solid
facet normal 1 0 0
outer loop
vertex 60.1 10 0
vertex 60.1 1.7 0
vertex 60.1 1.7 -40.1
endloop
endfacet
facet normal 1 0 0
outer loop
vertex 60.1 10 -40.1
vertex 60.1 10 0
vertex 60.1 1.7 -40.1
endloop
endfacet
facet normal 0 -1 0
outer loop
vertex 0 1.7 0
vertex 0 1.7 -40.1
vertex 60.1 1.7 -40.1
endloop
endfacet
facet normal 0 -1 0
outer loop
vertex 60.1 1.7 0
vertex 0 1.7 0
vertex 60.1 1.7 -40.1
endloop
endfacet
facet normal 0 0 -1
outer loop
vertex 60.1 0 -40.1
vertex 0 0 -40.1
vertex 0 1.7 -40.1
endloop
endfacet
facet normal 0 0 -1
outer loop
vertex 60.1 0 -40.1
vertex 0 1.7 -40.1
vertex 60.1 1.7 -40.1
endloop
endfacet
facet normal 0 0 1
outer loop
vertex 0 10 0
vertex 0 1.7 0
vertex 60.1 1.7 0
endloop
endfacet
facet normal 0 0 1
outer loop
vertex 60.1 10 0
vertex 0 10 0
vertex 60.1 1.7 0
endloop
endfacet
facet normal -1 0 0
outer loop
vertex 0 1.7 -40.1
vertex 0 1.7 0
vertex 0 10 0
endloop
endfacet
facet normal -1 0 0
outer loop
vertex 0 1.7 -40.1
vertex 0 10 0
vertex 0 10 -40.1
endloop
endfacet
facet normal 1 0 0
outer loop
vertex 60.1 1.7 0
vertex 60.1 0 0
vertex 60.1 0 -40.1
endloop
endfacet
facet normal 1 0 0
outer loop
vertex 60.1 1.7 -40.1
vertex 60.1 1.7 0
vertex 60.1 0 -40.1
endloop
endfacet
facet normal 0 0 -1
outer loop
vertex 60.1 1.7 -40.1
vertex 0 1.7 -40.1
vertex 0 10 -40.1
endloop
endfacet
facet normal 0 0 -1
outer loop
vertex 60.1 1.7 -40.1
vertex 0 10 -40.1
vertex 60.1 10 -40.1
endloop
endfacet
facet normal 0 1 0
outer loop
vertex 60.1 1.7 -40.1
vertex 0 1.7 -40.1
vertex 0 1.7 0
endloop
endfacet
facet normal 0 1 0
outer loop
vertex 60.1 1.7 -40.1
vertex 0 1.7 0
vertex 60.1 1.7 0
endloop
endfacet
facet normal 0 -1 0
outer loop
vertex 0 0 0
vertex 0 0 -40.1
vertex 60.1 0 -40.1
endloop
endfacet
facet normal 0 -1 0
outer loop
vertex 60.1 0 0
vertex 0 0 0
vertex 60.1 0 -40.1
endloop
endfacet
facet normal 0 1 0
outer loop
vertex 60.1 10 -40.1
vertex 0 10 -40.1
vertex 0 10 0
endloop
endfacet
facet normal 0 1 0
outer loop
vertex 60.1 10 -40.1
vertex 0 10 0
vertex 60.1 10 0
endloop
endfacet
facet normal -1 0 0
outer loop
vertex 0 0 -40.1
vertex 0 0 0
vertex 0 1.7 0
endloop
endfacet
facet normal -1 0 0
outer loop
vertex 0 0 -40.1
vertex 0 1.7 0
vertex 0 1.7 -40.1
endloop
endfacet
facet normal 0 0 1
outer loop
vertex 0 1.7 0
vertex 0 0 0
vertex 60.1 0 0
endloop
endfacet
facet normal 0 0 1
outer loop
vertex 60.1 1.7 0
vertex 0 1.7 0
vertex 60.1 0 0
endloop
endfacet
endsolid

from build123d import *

# Parameters (mm, degrees)
SKETCH1_W           = 60.1
SKETCH1_H           = 40.1
BOSS_EXTRUDE1_DEPTH = 1.7
BOSS_EXTRUDE2_START = 1.7
SKETCH1_2_W         = 60.1
SKETCH1_2_H         = 40.1
BOSS_EXTRUDE2_DEPTH = 8.3


with BuildPart() as part:
    # Sketch1 → Boss-Extrude1 (new body)
    with BuildSketch(Plane(origin=(0, 0, 0), x_dir=(1, 0, 0), z_dir=(0, 1, 0))):
        with Locations((30.05, 20.05)):
            Rectangle(SKETCH1_W, SKETCH1_H)
    extrude(amount=BOSS_EXTRUDE1_DEPTH)


with BuildPart() as body_2:
    # Sketch1<2> → Boss-Extrude2 (new body)
    with BuildSketch(Plane(origin=(0, 0, 0), x_dir=(1, 0, 0), z_dir=(0, 1, 0)).offset(BOSS_EXTRUDE2_START)):
        with Locations((30.05, 20.05)):
            Rectangle(SKETCH1_2_W, SKETCH1_2_H)
    extrude(amount=BOSS_EXTRUDE2_DEPTH)


solid = Compound([part.part, body_2.part])
